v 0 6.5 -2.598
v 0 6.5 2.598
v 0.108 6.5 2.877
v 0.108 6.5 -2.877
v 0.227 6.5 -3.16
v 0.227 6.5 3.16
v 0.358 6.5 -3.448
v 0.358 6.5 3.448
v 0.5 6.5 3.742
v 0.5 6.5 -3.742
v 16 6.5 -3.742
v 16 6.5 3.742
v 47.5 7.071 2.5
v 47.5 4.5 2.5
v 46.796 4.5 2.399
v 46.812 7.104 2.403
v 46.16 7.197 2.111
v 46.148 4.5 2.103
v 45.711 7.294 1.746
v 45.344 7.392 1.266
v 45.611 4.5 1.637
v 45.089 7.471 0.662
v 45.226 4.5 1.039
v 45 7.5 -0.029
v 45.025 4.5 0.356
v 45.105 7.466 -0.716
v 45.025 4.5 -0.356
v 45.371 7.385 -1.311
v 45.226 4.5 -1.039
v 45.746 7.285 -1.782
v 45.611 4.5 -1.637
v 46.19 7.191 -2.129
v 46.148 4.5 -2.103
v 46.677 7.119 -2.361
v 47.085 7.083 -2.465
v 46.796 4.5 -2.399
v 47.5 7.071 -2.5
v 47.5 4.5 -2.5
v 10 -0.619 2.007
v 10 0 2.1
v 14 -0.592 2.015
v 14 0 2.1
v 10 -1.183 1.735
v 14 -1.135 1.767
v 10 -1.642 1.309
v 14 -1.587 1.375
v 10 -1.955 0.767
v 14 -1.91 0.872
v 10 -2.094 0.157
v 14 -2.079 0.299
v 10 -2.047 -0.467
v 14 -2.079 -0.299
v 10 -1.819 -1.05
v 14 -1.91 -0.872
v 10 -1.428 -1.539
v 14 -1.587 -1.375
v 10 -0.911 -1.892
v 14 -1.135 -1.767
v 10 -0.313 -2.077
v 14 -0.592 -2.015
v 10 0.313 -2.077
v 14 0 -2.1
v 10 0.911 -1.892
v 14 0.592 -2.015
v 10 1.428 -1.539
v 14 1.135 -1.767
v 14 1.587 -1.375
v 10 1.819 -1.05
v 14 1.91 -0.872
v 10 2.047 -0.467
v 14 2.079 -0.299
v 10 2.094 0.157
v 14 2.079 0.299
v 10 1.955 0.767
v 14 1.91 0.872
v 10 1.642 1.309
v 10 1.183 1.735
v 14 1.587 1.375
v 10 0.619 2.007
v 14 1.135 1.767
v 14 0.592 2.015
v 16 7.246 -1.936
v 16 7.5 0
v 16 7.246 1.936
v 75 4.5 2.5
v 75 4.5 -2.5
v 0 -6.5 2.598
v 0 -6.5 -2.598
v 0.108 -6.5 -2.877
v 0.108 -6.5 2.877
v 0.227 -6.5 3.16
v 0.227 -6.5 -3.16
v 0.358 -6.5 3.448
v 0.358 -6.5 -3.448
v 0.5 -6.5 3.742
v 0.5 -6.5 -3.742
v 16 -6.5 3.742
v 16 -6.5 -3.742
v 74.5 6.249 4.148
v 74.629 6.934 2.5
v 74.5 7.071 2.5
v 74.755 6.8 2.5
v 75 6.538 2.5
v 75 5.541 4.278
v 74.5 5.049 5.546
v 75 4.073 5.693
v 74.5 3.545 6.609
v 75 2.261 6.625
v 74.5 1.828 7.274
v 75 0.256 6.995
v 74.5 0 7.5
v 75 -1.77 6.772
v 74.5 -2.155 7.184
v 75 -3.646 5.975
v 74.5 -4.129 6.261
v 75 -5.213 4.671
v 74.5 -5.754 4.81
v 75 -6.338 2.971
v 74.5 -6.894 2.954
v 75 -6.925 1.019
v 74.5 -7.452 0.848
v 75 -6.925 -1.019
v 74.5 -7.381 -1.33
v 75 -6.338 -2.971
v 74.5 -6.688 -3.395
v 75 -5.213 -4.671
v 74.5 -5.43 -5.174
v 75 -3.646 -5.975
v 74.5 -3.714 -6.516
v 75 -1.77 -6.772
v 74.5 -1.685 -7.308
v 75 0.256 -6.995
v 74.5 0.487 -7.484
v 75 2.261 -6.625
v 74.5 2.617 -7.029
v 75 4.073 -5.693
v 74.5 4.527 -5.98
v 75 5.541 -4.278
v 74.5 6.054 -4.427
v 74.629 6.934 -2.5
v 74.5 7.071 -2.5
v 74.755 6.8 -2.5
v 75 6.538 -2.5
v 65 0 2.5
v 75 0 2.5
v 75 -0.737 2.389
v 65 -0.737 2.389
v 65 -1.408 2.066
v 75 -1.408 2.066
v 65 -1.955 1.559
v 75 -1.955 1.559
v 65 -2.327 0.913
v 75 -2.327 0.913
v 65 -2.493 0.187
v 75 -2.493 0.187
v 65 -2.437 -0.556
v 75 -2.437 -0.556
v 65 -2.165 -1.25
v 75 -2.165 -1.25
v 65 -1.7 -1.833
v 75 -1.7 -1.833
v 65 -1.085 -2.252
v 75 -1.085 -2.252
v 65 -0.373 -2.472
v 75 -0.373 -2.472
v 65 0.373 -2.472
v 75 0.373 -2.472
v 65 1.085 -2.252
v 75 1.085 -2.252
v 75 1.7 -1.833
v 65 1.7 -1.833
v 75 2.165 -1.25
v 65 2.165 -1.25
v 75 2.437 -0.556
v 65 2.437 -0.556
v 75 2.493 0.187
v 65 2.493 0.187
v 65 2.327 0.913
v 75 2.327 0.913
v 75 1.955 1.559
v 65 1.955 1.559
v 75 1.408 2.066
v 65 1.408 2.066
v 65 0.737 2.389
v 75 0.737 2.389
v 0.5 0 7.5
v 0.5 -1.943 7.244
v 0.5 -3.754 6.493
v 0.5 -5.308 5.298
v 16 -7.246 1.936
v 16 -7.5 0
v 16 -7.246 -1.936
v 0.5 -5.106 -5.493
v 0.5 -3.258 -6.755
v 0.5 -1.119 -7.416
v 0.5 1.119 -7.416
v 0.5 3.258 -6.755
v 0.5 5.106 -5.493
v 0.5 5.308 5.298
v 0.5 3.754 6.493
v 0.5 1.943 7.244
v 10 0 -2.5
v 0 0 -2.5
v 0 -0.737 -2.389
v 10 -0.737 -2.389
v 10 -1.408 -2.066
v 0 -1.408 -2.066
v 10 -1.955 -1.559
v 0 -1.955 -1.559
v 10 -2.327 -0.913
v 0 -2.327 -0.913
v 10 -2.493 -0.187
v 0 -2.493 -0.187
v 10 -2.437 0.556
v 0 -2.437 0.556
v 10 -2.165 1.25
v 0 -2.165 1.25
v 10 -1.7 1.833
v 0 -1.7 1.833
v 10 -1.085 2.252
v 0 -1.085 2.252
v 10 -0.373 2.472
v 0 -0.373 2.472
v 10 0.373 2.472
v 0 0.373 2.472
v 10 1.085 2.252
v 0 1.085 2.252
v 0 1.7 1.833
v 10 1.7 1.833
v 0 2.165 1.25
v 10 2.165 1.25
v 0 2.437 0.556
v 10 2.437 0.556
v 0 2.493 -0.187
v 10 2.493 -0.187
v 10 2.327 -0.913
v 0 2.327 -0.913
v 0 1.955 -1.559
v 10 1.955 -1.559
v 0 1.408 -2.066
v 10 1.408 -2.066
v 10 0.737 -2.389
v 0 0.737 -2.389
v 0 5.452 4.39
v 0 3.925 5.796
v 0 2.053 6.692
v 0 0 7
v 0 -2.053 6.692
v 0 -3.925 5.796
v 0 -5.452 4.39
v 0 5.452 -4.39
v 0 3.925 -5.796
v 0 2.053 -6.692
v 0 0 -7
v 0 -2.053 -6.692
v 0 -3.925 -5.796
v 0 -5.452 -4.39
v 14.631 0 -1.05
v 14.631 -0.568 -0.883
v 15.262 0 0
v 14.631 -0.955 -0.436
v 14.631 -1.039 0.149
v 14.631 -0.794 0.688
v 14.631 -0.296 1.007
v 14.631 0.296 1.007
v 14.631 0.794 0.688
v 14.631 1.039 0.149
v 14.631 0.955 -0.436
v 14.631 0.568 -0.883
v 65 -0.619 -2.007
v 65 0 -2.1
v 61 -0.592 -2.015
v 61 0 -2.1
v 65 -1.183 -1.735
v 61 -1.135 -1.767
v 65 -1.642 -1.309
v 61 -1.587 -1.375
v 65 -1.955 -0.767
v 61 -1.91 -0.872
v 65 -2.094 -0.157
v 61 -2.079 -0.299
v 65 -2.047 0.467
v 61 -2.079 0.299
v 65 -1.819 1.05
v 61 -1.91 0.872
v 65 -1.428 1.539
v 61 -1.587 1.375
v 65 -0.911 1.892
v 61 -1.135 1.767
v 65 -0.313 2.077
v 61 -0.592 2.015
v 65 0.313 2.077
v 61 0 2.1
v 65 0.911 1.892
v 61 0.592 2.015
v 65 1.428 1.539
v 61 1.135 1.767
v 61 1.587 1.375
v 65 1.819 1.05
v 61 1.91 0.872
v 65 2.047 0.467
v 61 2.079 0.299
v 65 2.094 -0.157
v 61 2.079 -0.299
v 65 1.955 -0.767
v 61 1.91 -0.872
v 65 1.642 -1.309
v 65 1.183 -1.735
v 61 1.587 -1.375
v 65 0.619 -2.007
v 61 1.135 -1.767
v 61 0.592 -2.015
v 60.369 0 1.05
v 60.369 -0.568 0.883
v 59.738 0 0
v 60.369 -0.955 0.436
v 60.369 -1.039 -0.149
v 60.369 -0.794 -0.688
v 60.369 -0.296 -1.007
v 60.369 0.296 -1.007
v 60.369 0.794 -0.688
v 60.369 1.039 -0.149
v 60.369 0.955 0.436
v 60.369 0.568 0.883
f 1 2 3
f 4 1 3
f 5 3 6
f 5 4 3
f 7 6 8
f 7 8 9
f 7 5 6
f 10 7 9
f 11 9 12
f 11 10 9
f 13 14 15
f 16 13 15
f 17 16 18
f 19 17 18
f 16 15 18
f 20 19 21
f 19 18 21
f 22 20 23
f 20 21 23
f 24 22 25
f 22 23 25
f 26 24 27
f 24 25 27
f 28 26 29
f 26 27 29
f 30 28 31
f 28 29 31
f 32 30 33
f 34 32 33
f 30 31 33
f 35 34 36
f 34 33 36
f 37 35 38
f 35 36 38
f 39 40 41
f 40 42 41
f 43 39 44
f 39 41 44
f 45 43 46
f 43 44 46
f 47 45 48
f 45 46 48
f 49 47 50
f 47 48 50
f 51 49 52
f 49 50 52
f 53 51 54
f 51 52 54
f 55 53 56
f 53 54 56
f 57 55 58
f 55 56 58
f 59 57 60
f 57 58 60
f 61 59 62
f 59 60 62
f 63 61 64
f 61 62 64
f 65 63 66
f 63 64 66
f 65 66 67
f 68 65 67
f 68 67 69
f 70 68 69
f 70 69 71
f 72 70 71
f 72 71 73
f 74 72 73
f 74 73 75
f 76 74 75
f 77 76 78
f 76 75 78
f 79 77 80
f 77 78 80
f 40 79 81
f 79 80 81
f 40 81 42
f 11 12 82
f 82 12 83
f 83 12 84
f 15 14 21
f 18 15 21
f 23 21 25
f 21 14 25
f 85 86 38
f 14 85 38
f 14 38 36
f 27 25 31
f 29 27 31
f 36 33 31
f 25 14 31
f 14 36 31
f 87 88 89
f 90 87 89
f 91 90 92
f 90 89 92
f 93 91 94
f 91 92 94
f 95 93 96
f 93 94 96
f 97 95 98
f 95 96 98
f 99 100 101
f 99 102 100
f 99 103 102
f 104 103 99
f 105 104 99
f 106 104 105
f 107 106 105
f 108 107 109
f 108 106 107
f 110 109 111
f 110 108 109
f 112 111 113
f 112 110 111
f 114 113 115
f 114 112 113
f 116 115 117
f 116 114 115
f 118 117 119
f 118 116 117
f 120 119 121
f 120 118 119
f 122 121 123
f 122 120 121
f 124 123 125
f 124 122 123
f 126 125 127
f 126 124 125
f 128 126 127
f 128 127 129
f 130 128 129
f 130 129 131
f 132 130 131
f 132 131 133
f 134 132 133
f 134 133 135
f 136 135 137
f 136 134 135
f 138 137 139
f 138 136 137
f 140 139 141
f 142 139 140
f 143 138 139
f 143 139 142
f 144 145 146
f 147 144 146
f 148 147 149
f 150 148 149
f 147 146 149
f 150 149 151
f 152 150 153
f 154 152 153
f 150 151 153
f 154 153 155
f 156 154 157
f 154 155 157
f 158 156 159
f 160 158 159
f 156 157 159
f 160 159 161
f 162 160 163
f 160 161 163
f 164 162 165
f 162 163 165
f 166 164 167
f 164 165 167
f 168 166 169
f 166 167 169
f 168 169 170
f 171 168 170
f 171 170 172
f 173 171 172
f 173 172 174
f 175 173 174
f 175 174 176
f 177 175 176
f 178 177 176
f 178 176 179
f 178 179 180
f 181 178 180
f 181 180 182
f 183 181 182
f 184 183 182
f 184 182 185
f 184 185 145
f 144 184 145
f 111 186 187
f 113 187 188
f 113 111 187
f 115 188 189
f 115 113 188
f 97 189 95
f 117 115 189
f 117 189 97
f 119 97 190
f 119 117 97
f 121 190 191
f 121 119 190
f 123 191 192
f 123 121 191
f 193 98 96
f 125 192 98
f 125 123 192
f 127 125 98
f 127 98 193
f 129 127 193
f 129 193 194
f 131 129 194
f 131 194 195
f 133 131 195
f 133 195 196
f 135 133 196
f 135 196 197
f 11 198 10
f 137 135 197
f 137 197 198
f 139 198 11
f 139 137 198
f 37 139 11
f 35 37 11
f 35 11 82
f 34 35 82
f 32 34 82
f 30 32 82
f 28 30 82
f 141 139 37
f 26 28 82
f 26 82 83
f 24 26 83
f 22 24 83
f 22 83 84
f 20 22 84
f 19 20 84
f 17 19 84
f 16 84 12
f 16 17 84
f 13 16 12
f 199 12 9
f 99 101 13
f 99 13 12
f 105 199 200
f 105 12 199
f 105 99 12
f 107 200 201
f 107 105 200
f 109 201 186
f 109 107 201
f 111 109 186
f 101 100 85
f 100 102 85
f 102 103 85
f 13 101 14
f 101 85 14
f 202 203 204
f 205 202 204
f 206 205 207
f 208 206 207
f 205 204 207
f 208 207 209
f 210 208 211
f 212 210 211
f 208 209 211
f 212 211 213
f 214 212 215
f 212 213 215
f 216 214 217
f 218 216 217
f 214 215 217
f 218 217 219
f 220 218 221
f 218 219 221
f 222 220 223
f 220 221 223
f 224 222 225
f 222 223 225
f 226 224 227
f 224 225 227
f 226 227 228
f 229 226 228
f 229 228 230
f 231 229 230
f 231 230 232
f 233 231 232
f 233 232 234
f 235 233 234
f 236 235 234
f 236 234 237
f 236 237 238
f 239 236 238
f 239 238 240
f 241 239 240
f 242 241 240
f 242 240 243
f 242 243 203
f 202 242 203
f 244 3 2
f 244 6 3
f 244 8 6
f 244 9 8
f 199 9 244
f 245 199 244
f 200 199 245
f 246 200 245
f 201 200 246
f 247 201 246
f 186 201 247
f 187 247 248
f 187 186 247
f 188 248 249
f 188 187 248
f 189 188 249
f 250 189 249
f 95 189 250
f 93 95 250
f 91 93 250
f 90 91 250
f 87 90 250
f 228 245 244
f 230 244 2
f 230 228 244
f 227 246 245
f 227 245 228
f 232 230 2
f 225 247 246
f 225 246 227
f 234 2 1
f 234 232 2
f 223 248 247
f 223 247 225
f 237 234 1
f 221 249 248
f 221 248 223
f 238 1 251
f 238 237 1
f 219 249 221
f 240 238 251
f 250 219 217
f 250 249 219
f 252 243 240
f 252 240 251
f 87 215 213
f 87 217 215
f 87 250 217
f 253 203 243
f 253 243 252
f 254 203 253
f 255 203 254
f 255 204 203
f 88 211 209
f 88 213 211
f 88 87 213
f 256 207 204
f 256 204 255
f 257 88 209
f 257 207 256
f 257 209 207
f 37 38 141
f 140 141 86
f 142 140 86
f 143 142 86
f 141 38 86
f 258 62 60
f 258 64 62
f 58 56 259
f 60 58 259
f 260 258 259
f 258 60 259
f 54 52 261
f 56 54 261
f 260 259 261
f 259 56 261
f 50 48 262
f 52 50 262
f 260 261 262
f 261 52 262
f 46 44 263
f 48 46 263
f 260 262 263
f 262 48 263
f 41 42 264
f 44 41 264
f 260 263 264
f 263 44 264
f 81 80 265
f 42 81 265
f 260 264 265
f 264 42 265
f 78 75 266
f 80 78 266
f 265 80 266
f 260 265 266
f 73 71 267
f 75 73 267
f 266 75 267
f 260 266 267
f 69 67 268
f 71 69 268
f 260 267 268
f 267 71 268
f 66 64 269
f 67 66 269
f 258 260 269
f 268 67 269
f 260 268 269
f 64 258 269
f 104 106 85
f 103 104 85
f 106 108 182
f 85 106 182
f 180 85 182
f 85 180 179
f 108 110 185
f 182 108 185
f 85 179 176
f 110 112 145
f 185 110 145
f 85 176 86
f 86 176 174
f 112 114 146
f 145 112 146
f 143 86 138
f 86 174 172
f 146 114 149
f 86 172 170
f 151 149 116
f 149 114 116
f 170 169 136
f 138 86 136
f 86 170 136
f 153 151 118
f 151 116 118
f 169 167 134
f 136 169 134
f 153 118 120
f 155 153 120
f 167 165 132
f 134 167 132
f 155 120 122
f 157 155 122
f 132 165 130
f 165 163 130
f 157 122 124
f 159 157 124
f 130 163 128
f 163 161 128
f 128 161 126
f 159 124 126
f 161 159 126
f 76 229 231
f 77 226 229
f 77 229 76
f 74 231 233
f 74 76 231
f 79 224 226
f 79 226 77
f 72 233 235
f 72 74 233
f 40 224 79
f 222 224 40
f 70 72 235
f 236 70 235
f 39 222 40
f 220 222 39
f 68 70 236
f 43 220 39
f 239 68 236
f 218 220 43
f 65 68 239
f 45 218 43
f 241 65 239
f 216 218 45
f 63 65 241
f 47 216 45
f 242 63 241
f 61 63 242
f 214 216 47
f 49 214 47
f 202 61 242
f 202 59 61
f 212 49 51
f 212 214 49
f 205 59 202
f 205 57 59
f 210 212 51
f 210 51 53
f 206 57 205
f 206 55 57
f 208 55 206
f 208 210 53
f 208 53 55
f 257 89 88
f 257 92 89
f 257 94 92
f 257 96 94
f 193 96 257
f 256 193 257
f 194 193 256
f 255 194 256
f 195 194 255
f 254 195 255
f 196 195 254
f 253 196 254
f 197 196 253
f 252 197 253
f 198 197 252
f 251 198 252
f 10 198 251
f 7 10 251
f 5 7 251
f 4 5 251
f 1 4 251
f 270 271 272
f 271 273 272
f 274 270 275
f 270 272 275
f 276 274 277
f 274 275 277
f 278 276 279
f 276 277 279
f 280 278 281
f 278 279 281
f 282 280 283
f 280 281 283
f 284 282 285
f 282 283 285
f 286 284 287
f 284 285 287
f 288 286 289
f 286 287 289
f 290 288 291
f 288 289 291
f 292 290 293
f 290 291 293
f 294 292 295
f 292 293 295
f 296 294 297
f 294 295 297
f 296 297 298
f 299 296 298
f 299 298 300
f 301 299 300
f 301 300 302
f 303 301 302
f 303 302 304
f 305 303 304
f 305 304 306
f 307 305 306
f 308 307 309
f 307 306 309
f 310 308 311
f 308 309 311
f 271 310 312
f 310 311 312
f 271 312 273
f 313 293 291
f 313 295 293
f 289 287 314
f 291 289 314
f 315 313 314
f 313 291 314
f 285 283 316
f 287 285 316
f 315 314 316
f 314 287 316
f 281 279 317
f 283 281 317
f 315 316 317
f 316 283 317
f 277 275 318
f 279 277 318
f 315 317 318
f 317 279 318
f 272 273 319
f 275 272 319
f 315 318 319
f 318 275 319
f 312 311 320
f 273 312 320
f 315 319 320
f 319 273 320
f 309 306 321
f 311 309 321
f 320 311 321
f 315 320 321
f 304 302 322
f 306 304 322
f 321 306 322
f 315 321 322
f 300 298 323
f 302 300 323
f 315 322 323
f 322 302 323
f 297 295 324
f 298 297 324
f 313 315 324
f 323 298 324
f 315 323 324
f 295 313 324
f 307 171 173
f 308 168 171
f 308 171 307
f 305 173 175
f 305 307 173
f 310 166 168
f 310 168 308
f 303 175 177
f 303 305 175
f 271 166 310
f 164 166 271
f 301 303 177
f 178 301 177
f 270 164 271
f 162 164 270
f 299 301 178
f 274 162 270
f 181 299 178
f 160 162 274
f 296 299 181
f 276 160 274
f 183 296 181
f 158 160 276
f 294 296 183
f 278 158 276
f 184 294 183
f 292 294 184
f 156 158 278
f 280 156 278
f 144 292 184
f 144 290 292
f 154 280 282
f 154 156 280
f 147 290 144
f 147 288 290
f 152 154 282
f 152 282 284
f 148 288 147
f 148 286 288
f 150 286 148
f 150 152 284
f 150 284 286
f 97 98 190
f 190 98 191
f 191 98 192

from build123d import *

# Parameters (mm, degrees)
SKETCH_2_W                     = 75
SKETCH_2_H                     = 7.5
CUT_EXTRUDE_START              = 4.5
CUT_EXTRUDE_1_DEPTH            = 72.246287038
CUT_EXTRUDE_2_DEPTH            = 76.746287157
CUT_EXTRUDE_2_DEPTH_BACK       = 76.746287157
SKETCH_4_W                     = 16
SKETCH_4_H                     = 1
M5X0_8_1_D                     = 4.2
M5X0_8_1_DEPTH                 = 14
M5X0_8_1_CBORE_D               = 5
M5X0_8_1_CBORE_DEPTH           = 10
M5X0_8_1_TIP                   = 1.2618073
M5X0_8_1_ON_FACE_2_D           = 4.2
M5X0_8_1_ON_FACE_2_DEPTH       = 14
M5X0_8_1_ON_FACE_2_CBORE_D     = 5
M5X0_8_1_ON_FACE_2_CBORE_DEPTH = 10
M5X0_8_1_ON_FACE_2_TIP         = 1.2618073
CHAMFER_1_SIZE                 = 0.5


with BuildPart() as part:
    # ｽｹｯﾁ2 → 回転1 (revolve)
    with BuildSketch(Plane.XY, mode=Mode.PRIVATE) as revolve_1_sk:
        with Locations((37.5, 3.75)):
            Rectangle(SKETCH_2_W, SKETCH_2_H)
    revolve(revolve_1_sk.sketch.rotate(Axis((0, 0, 0), (1, 0, 0)), 90), axis=Axis((0, 0, 0), (1, 0, 0)))

    # ｽｹｯﾁ3 → ｶｯﾄ - 押し出し1 (cut, through all)
    with BuildSketch(Plane(origin=(0, 0, 0), x_dir=(1, 0, 0), z_dir=(0, 1, 0)).offset(CUT_EXTRUDE_START)):
        with BuildLine():
            Line((47.5, 2.5), (75, 2.5))
            Line((75, 2.5), (75, -2.5))
            Line((75, -2.5), (47.5, -2.5))
            ThreePointArc((47.5, -2.5), (45, 0), (47.5, 2.5))
        make_face()
    extrude(amount=CUT_EXTRUDE_1_DEPTH, mode=Mode.SUBTRACT)

    # ｽｹｯﾁ4 → ｶｯﾄ - 押し出し2 (cut, two sides: drawn at the far end of the back side and taken through both)
    with BuildSketch(Plane.XY.offset(-CUT_EXTRUDE_2_DEPTH_BACK)):
        with Locations((8, 7)):
            Rectangle(SKETCH_4_W, SKETCH_4_H)
        with Locations((8, -7)):
            Rectangle(SKETCH_4_W, SKETCH_4_H)
    extrude(amount=CUT_EXTRUDE_2_DEPTH + CUT_EXTRUDE_2_DEPTH_BACK, mode=Mode.SUBTRACT)

    # M5x0.8 ねじ穴1
    with Locations(Plane(origin=(0, 0, 0), x_dir=(0, 0, -1), z_dir=(-1, 0, 0))):
        with Locations((0, 0)):
            CounterBoreHole(M5X0_8_1_D / 2, M5X0_8_1_CBORE_D / 2, M5X0_8_1_CBORE_DEPTH, depth=M5X0_8_1_DEPTH)
            with Locations((0, 0, -(M5X0_8_1_DEPTH + M5X0_8_1_TIP / 2))):  # 118° drill point
                Cone(0, M5X0_8_1_D / 2, M5X0_8_1_TIP, mode=Mode.SUBTRACT)

    # M5x0.8 ねじ穴1 on face 2
    with Locations(Plane(origin=(75, 0, 0), x_dir=(0, 0, 1), z_dir=(1, 0, 0))):
        with Locations((0, 0)):
            CounterBoreHole(M5X0_8_1_ON_FACE_2_D / 2, M5X0_8_1_ON_FACE_2_CBORE_D / 2, M5X0_8_1_ON_FACE_2_CBORE_DEPTH, depth=M5X0_8_1_ON_FACE_2_DEPTH)
            with Locations((0, 0, -(M5X0_8_1_ON_FACE_2_DEPTH + M5X0_8_1_ON_FACE_2_TIP / 2))):  # 118° drill point
                Cone(0, M5X0_8_1_ON_FACE_2_D / 2, M5X0_8_1_ON_FACE_2_TIP, mode=Mode.SUBTRACT)

    # 面取り1
    chamfer_1_edges = [part.edges().sort_by_distance(p)[0] for p in [
        (0, 0, -7.5),
        (0, -3.754168989, 6.492781777),
        (75, -6.123724357, -4.330127019),
    ]]
    chamfer(chamfer_1_edges, length=CHAMFER_1_SIZE)


solid = part.part
